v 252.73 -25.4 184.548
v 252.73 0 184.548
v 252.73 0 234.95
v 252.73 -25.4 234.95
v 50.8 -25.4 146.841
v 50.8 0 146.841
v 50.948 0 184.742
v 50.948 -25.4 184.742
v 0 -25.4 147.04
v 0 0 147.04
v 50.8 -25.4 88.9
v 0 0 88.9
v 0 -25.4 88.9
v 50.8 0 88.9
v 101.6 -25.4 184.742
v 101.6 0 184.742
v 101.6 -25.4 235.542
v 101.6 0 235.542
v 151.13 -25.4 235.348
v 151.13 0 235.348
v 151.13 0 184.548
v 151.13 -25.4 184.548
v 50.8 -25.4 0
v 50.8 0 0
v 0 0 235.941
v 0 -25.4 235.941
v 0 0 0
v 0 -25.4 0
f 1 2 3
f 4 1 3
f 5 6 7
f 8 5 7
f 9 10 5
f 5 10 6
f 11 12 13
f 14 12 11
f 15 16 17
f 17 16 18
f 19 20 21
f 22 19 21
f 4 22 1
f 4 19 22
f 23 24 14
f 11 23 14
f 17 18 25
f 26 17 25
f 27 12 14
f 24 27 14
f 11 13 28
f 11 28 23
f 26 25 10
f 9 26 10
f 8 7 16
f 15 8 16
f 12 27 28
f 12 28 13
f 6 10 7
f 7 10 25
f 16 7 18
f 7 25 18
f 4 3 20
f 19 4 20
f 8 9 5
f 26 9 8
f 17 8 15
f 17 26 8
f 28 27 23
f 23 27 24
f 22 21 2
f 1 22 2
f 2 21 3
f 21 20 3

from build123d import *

# Parameters (mm, degrees)
F1_DEPTH = 25.4
F0_W     = 50.8
F0_H     = 88.9
F2_DEPTH = 25.4
F3_DEPTH = 25.4


# Not quite as in the source:
# - the program builds the solid bodies; features that only make, move or delete a surface that nothing else refers to are left out


with BuildPart() as f1:
    # F0 (on Front) → F1 (new body)
    with BuildSketch(Plane.XZ):
        Polygon((151.13, 184.5482311558), (252.73, 184.5482311558), (252.73, 234.95), (151.13, 235.3482311558), align=None)
    extrude(amount=F1_DEPTH)


with BuildPart() as f1b:
    # F0 (on Front) → F1, piece 2 (new body)
    with BuildSketch(Plane.XZ):
        Polygon((51.1480593626, 235.7401201693), (50.9481686791, 184.7423688442), (101.6, 184.7423688442), (101.6, 235.5423688442), align=None)
    extrude(amount=F1_DEPTH)

    # F0 (on Front) → F3 (join)
    with BuildSketch(Plane.XZ):
        Polygon((0, 235.9406), (0, 184.7423688442), (50.9481686791, 184.7423688442), (51.1480593626, 235.7401201693), align=None)
        Polygon((0, 184.7423688442), (0, 147.0399171062), (50.799609778, 146.8408030579), (50.9481686791, 184.7423688442), align=None)
    extrude(amount=F3_DEPTH)


with BuildPart() as f2:
    # F0 (on Front) → F2 (new body)
    with BuildSketch(Plane.XZ):
        with Locations((25.4, 44.45)):
            Rectangle(F0_W, F0_H)
    extrude(amount=F2_DEPTH)


solid = Compound([f1.part, f1b.part, f2.part])
